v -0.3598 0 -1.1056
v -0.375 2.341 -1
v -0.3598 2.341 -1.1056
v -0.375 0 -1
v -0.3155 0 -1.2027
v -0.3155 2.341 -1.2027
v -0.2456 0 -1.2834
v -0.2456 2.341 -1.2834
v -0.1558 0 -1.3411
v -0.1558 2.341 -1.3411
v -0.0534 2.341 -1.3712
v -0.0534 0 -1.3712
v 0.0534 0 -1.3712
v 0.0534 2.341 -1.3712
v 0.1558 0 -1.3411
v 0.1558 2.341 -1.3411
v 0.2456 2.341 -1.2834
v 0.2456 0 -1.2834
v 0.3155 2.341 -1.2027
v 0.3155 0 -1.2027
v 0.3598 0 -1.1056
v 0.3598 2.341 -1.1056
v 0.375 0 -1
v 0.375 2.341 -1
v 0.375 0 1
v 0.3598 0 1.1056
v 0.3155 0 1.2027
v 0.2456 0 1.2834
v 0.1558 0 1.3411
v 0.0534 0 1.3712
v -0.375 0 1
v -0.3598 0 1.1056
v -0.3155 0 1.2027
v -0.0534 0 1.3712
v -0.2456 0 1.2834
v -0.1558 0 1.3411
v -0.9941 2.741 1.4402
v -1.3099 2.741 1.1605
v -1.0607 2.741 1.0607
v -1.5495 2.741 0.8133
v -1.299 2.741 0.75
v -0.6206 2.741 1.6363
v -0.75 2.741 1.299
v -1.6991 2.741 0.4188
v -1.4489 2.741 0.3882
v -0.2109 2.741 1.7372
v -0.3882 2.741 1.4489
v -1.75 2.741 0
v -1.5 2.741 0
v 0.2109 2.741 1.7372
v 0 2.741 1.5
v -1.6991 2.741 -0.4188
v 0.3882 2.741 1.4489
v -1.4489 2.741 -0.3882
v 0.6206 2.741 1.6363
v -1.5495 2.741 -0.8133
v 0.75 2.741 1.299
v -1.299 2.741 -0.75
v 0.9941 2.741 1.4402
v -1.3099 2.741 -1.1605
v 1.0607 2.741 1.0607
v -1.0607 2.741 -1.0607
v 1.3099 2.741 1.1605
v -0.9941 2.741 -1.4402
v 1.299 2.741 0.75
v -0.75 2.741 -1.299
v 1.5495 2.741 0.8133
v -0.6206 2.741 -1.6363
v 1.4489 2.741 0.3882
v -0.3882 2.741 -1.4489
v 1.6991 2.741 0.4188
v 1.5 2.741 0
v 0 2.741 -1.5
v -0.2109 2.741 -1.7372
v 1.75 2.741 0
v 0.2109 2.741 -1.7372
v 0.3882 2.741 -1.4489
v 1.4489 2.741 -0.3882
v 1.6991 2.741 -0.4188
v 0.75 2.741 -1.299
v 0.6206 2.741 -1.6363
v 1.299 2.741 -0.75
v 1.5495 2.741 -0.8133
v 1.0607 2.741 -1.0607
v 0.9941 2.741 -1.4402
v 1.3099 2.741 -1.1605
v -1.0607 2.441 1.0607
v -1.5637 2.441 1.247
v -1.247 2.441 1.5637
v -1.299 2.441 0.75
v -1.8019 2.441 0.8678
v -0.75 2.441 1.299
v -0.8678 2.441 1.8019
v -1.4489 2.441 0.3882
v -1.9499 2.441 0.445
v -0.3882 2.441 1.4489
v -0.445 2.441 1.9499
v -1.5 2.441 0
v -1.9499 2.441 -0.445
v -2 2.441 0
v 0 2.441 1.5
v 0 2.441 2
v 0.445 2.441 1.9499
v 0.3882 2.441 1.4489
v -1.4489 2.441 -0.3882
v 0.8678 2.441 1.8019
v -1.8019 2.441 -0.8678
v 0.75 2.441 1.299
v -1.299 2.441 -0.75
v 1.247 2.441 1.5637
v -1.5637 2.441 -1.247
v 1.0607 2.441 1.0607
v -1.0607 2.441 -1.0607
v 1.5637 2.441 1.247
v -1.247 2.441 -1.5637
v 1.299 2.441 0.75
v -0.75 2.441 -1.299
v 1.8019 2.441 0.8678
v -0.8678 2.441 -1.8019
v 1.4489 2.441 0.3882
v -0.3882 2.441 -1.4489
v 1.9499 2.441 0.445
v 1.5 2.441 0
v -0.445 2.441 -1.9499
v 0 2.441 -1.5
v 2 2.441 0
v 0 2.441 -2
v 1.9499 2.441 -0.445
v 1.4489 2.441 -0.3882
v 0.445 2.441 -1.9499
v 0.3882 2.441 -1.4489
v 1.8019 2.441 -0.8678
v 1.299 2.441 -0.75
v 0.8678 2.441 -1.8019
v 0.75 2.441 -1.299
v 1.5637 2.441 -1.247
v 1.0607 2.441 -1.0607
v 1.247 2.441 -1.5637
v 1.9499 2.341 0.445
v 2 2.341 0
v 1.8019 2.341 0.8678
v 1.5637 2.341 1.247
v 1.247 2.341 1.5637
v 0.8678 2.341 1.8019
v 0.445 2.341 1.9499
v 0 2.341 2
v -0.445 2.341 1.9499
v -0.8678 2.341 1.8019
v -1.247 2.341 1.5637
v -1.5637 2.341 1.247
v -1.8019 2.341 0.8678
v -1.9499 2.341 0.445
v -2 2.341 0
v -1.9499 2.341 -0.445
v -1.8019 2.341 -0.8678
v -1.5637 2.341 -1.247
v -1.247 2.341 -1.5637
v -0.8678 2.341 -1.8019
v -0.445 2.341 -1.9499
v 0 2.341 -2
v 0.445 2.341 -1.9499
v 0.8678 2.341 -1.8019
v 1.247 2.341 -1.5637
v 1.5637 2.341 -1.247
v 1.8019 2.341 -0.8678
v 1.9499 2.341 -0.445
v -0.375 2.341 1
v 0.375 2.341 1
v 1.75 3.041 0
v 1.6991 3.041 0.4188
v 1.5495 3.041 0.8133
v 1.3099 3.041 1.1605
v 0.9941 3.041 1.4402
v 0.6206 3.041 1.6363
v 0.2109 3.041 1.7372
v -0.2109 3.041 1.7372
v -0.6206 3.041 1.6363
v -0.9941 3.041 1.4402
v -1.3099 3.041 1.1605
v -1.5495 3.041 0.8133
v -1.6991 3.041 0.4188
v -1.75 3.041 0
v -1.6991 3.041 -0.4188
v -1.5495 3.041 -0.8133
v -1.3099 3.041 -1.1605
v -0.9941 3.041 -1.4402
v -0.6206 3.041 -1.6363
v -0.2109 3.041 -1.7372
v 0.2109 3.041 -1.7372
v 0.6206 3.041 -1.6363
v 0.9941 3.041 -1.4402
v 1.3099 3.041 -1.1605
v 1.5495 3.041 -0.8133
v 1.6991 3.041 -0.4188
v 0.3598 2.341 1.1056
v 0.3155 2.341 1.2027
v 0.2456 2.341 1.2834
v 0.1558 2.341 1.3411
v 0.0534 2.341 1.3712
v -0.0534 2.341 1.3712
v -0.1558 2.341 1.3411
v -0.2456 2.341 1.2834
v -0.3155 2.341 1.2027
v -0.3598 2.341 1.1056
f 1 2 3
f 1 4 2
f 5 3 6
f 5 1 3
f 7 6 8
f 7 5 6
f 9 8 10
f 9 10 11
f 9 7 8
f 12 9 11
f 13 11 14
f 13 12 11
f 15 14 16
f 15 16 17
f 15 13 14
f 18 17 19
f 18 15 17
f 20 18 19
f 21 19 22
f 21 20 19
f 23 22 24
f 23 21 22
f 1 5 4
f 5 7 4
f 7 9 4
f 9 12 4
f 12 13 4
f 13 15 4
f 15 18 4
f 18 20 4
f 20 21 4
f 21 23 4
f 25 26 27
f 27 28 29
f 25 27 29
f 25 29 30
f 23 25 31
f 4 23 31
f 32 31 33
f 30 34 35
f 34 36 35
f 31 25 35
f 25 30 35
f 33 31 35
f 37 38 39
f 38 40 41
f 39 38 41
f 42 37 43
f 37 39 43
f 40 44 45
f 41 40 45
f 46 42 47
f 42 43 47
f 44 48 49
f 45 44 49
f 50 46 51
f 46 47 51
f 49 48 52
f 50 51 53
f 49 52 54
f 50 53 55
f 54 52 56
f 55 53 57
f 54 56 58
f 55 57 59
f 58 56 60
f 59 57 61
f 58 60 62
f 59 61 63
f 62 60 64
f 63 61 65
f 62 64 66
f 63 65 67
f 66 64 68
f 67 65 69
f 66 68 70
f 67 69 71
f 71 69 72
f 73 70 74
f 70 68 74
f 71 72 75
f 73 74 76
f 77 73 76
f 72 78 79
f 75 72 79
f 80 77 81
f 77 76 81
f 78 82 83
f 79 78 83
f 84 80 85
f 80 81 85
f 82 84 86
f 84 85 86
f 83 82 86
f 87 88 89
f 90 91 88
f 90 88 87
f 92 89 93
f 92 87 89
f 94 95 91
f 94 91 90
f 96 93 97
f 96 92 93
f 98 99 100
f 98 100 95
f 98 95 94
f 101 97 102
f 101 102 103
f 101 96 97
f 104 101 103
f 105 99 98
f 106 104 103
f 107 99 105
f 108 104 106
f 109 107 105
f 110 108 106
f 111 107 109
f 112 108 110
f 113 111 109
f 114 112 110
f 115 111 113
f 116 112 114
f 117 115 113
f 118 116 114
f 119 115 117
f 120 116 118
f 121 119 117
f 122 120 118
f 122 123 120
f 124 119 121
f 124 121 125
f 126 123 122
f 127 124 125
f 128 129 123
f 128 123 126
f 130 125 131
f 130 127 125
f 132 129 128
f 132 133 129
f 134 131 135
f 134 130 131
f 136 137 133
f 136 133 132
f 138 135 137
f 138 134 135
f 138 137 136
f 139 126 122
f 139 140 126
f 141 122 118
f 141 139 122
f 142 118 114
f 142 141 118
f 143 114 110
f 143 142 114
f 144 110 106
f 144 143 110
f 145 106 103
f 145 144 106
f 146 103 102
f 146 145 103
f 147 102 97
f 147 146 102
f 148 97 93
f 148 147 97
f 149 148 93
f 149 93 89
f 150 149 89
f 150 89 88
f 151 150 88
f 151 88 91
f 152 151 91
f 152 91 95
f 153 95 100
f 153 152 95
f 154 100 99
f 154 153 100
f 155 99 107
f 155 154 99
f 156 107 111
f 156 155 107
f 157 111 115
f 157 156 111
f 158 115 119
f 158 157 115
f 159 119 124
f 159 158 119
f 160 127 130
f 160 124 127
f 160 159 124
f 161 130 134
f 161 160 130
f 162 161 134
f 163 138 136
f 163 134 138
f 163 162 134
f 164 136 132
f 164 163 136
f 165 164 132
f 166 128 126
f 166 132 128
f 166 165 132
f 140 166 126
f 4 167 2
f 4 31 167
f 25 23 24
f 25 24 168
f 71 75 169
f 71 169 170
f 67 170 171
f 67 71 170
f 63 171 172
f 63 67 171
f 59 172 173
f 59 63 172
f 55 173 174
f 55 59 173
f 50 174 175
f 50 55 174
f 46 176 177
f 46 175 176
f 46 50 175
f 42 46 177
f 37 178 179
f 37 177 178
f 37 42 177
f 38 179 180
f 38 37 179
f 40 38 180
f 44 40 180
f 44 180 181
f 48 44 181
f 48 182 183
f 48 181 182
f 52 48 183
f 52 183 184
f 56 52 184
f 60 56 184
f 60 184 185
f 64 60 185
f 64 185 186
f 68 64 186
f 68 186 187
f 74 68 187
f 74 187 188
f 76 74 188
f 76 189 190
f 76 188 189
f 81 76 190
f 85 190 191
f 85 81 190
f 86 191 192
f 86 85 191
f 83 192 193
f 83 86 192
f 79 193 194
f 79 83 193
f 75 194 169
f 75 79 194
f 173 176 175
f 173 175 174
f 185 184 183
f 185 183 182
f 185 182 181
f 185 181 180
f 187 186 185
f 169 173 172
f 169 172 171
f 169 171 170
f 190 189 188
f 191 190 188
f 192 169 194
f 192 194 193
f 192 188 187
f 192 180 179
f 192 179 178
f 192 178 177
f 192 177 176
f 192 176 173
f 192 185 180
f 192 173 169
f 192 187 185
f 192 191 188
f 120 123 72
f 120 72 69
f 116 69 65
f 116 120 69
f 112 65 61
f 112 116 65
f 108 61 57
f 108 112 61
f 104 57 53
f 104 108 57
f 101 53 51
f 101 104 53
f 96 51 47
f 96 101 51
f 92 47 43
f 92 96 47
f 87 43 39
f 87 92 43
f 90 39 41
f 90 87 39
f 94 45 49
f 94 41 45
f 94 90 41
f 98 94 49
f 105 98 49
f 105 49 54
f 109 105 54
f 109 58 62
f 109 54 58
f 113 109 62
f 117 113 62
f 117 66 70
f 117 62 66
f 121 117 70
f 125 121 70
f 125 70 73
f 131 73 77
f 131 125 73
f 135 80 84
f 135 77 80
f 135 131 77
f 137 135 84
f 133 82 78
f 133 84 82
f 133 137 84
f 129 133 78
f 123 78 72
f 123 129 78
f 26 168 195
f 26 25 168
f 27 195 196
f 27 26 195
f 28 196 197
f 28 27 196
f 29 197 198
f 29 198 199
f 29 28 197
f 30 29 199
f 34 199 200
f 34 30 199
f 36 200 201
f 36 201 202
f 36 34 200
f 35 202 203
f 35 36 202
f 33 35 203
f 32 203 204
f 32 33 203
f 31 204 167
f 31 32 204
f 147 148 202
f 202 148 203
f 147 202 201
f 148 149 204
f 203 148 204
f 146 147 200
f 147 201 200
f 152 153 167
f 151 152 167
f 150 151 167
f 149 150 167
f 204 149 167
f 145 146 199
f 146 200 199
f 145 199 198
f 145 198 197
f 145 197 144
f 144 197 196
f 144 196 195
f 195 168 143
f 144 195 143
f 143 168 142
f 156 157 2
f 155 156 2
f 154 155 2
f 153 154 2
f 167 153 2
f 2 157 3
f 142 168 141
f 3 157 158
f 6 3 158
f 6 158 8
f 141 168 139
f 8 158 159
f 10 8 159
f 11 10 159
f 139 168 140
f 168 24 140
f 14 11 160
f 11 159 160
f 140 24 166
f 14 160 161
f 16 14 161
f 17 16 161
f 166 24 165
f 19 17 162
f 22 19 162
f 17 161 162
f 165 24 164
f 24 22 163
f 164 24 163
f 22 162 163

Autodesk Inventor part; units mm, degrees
ref_plane "YZ Plane" through (0, 0, 0) normal (1, 0, 0) x (0, 1, 0)
ref_plane "XZ Plane" through (0, 0, 0) normal (0, 1, 0) x (-1, 0, 0)
ref_plane "XY Plane" through (0, 0, 0) normal (0, 0, 1) x (1, 0, 0)
sketch "Sketch1" plane through (0, 0, 0) normal (0, 1, 0) x (-1, 0, 0)
  circle A0 centre (0, 0) radius 1.905
  dimension "d0" = 3.81
extrude "Extrusion1" add sketch "Sketch1" along normal blind 2.341
sketch "Sketch2" plane through (0, 2.341, 0) normal (0, 1, 0) x (1, 0, 0)
  circle A0 centre (0, 0) radius 2
  dimension "d3" = 4
extrude "Extrusion2" add sketch "Sketch2" along normal blind 0.1
sketch "Sketch8" plane through (0, 0, 0) normal (0, -1, 0) x (1, 0, 0)
  line L0 (0, 1) -> (0, -1) construction
  line L1 (-0.375, 1) -> (-0.375, -1)
  line L2 (0.375, -1) -> (0.375, 1)
  arc A0 (0.375, 1) -> (-0.375, 1) centre (0, 1) ccw
  arc A1 (-0.375, -1) -> (0.375, -1) centre (0, -1) ccw
  circle A2 centre (0, 0) radius 1.905
  dimension "d22" = 1
  dimension "d23" = 0.75
extrude "Extrusion4" cut sketch "Sketch8" against normal up to surface (2.341 mm away)
sketch "Sketch9" plane through (0, 2.441, 0) normal (0, 1, 0) x (1, 0, 0)
  circle A0 centre (0, 0) radius 1.5
  dimension "d26" = 3
extrude "Extrusion5" add sketch "Sketch9" along normal blind 0.3
sketch "Sketch10" plane through (0, 2.741, 0) normal (0, 1, 0) x (1, 0, 0)
  circle A0 centre (0, 0) radius 1.75
  dimension "d29" = 3.5
extrude "Extrusion6" add sketch "Sketch10" along normal blind 0.3
properties part number "Pin Hole Lock"
